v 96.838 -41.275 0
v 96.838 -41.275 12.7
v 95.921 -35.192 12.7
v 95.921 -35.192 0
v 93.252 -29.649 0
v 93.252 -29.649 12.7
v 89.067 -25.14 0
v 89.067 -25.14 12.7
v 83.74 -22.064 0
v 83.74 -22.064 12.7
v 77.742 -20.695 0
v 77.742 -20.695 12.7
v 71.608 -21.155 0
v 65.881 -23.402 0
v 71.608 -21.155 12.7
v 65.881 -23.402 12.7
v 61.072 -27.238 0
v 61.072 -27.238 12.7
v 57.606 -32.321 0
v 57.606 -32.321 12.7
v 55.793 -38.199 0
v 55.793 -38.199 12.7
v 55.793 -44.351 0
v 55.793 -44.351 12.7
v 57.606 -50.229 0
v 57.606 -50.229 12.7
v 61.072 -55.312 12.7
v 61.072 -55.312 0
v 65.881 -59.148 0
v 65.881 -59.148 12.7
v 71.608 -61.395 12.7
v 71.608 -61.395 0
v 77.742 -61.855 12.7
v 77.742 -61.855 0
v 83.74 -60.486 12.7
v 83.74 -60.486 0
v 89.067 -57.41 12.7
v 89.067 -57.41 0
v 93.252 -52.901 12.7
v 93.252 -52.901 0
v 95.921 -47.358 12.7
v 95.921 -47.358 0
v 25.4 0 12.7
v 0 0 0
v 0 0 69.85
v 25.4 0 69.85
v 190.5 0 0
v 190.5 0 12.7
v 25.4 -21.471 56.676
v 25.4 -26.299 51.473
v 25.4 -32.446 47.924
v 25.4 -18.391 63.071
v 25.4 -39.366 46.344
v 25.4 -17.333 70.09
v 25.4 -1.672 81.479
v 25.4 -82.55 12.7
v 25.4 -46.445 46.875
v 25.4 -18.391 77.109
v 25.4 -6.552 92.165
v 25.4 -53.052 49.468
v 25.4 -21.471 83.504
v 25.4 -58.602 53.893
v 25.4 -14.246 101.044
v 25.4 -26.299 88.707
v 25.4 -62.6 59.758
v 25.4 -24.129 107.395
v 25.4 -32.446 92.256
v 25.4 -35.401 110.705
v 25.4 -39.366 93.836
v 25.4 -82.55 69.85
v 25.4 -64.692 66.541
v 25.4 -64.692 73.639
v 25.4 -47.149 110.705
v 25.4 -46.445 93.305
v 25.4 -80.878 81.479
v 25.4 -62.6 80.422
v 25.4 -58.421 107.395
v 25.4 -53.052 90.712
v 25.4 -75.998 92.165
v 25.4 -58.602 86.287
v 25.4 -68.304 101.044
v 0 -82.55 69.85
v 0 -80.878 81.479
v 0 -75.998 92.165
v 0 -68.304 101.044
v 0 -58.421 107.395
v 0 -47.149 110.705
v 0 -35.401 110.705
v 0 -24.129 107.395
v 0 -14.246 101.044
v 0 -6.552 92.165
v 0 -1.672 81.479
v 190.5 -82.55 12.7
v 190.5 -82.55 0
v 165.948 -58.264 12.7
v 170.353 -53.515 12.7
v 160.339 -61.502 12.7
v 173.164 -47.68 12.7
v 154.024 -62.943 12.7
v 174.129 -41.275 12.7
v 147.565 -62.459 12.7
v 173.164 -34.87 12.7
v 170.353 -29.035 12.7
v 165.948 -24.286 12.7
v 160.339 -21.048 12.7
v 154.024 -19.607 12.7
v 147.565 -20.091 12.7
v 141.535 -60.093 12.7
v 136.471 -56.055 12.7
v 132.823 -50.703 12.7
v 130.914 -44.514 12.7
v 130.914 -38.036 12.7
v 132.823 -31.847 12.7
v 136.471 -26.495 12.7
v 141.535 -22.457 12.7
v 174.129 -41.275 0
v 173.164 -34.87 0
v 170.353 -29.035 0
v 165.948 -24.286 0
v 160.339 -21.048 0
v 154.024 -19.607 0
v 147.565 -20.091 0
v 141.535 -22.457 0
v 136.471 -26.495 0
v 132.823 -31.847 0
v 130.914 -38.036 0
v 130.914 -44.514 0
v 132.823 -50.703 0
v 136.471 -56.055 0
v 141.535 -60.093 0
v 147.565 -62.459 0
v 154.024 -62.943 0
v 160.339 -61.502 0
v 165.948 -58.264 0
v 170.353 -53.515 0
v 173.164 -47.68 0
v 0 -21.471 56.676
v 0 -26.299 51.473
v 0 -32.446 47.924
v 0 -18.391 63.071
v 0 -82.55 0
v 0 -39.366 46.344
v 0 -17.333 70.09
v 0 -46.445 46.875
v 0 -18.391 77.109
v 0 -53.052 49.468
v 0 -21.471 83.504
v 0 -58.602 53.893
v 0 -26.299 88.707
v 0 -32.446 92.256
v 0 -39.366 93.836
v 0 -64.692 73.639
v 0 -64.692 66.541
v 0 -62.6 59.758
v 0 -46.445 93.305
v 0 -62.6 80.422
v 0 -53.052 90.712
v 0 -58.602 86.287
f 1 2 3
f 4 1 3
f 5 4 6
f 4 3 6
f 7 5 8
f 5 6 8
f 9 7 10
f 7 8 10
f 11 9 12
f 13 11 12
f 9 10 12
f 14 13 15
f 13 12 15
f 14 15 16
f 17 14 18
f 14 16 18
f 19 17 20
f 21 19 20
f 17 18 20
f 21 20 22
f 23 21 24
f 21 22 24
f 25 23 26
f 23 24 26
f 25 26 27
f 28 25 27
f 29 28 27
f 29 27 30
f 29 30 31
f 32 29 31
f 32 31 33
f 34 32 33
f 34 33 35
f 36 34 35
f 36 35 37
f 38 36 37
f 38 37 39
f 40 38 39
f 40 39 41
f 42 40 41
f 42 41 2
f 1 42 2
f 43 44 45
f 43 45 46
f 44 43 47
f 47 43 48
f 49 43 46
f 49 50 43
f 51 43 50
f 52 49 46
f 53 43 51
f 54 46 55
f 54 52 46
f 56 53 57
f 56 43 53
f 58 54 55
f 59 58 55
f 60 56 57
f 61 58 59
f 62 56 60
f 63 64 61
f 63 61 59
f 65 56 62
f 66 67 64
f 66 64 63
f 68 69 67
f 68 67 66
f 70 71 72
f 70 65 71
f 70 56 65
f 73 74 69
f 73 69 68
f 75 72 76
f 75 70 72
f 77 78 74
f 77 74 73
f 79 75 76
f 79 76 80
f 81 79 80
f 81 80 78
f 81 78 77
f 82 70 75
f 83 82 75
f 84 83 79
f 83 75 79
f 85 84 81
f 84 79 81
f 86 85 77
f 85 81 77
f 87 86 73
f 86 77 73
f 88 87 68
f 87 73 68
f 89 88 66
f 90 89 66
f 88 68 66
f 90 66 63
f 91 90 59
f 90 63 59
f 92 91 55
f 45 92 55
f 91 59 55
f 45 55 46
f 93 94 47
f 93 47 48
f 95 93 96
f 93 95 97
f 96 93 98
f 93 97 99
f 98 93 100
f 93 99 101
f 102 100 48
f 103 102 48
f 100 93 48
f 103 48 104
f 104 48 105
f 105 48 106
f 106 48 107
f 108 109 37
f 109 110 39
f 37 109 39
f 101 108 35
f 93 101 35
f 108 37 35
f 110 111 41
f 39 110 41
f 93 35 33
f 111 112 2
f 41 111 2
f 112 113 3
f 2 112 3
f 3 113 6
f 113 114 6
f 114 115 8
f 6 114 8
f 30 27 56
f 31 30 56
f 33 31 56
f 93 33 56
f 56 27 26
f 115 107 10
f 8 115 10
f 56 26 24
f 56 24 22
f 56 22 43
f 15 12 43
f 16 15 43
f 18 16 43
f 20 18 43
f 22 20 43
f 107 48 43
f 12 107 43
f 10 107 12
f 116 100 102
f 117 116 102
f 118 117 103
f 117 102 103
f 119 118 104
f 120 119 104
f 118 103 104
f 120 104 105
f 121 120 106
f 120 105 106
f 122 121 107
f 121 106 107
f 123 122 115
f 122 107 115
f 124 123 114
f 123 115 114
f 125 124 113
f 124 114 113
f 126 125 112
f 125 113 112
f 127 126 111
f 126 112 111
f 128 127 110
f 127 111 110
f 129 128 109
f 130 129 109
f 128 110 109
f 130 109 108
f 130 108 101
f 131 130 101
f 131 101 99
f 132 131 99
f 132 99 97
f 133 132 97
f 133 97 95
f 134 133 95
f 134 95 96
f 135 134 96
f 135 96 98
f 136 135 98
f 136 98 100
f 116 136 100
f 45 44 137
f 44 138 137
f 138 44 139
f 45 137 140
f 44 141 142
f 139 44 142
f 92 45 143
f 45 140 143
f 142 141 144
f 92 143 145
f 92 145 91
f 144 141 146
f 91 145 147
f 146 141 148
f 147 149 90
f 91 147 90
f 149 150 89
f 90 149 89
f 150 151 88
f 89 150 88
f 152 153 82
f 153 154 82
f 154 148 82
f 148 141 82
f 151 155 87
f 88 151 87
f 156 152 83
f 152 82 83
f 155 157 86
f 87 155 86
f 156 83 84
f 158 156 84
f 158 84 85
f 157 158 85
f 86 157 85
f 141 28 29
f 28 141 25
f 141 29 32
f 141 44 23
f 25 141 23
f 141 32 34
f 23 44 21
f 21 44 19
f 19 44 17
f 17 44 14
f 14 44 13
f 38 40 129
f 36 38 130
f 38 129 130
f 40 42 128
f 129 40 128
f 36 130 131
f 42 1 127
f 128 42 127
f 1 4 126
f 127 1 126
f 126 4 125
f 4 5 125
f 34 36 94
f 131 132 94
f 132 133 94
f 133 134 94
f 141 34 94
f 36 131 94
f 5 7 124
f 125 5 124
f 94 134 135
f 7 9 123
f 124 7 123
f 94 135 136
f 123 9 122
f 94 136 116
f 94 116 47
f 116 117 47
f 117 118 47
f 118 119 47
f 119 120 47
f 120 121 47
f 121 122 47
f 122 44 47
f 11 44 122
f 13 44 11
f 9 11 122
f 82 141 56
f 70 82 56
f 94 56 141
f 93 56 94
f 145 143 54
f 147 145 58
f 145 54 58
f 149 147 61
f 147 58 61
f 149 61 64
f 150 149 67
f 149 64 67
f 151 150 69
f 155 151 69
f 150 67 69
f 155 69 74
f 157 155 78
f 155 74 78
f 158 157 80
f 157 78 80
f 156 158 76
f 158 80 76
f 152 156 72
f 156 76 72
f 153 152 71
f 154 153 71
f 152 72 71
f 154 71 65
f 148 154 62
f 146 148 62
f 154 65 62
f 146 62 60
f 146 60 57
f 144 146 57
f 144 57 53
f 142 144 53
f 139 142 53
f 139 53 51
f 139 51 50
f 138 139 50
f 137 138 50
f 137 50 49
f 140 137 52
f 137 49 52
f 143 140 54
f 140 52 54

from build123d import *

# Parameters (mm, degrees)
F1_DEPTH = 82.55
F2_W     = 25.4
F2_H     = 69.85
F3_DEPTH = 82.55
F4_R     = 20.6375
F4_R_2   = 21.729164
F5_DEPTH = 25.4
F7_DEPTH = 25.4
F8_R     = 23.8125
F9_DEPTH = 25.4


with BuildPart() as f1:
    # F0 (on Front) → F1 (new body)
    with BuildSketch(Plane.XZ):
        Polygon((0, 57.15), (0, 0), (190.5, 0), (190.5, 12.7), (25.4, 12.7), (25.4, 57.15), align=None)
    extrude(amount=F1_DEPTH)

    # F2 (on face) → F3 (join)
    with BuildSketch(Plane.XZ.offset(82.55)):
        with Locations((12.7, 92.075)):
            Rectangle(F2_W, F2_H)
    extrude(amount=-F3_DEPTH)

    # F4 (on face) → F5 (cut)
    with BuildSketch(Plane.XY.offset(12.7)):
        with Locations((76.2, -41.275)):
            Circle(F4_R)
        with Locations((152.4, -41.275)):
            Circle(F4_R_2)
    extrude(amount=-F5_DEPTH, mode=Mode.SUBTRACT)

    # F6 (on face) → F7 (cut)
    with BuildSketch(Plane.YZ.offset(25.4)):
        with BuildLine():
            ThreePointArc((-82.55, 69.85), (-41.275, 111.125), (0, 69.85))
            Line((0, 69.85), (0, 127))
            Line((0, 127), (-82.55, 127))
            Line((-82.55, 127), (-82.55, 69.85))
        make_face()
    extrude(amount=-F7_DEPTH, mode=Mode.SUBTRACT)

    # F8 (on face) → F9 (cut)
    with BuildSketch(Plane.YZ.offset(25.4)):
        with Locations((-41.145787, 70.089974)):
            Circle(F8_R)
    extrude(amount=-F9_DEPTH, mode=Mode.SUBTRACT)


solid = f1.part
